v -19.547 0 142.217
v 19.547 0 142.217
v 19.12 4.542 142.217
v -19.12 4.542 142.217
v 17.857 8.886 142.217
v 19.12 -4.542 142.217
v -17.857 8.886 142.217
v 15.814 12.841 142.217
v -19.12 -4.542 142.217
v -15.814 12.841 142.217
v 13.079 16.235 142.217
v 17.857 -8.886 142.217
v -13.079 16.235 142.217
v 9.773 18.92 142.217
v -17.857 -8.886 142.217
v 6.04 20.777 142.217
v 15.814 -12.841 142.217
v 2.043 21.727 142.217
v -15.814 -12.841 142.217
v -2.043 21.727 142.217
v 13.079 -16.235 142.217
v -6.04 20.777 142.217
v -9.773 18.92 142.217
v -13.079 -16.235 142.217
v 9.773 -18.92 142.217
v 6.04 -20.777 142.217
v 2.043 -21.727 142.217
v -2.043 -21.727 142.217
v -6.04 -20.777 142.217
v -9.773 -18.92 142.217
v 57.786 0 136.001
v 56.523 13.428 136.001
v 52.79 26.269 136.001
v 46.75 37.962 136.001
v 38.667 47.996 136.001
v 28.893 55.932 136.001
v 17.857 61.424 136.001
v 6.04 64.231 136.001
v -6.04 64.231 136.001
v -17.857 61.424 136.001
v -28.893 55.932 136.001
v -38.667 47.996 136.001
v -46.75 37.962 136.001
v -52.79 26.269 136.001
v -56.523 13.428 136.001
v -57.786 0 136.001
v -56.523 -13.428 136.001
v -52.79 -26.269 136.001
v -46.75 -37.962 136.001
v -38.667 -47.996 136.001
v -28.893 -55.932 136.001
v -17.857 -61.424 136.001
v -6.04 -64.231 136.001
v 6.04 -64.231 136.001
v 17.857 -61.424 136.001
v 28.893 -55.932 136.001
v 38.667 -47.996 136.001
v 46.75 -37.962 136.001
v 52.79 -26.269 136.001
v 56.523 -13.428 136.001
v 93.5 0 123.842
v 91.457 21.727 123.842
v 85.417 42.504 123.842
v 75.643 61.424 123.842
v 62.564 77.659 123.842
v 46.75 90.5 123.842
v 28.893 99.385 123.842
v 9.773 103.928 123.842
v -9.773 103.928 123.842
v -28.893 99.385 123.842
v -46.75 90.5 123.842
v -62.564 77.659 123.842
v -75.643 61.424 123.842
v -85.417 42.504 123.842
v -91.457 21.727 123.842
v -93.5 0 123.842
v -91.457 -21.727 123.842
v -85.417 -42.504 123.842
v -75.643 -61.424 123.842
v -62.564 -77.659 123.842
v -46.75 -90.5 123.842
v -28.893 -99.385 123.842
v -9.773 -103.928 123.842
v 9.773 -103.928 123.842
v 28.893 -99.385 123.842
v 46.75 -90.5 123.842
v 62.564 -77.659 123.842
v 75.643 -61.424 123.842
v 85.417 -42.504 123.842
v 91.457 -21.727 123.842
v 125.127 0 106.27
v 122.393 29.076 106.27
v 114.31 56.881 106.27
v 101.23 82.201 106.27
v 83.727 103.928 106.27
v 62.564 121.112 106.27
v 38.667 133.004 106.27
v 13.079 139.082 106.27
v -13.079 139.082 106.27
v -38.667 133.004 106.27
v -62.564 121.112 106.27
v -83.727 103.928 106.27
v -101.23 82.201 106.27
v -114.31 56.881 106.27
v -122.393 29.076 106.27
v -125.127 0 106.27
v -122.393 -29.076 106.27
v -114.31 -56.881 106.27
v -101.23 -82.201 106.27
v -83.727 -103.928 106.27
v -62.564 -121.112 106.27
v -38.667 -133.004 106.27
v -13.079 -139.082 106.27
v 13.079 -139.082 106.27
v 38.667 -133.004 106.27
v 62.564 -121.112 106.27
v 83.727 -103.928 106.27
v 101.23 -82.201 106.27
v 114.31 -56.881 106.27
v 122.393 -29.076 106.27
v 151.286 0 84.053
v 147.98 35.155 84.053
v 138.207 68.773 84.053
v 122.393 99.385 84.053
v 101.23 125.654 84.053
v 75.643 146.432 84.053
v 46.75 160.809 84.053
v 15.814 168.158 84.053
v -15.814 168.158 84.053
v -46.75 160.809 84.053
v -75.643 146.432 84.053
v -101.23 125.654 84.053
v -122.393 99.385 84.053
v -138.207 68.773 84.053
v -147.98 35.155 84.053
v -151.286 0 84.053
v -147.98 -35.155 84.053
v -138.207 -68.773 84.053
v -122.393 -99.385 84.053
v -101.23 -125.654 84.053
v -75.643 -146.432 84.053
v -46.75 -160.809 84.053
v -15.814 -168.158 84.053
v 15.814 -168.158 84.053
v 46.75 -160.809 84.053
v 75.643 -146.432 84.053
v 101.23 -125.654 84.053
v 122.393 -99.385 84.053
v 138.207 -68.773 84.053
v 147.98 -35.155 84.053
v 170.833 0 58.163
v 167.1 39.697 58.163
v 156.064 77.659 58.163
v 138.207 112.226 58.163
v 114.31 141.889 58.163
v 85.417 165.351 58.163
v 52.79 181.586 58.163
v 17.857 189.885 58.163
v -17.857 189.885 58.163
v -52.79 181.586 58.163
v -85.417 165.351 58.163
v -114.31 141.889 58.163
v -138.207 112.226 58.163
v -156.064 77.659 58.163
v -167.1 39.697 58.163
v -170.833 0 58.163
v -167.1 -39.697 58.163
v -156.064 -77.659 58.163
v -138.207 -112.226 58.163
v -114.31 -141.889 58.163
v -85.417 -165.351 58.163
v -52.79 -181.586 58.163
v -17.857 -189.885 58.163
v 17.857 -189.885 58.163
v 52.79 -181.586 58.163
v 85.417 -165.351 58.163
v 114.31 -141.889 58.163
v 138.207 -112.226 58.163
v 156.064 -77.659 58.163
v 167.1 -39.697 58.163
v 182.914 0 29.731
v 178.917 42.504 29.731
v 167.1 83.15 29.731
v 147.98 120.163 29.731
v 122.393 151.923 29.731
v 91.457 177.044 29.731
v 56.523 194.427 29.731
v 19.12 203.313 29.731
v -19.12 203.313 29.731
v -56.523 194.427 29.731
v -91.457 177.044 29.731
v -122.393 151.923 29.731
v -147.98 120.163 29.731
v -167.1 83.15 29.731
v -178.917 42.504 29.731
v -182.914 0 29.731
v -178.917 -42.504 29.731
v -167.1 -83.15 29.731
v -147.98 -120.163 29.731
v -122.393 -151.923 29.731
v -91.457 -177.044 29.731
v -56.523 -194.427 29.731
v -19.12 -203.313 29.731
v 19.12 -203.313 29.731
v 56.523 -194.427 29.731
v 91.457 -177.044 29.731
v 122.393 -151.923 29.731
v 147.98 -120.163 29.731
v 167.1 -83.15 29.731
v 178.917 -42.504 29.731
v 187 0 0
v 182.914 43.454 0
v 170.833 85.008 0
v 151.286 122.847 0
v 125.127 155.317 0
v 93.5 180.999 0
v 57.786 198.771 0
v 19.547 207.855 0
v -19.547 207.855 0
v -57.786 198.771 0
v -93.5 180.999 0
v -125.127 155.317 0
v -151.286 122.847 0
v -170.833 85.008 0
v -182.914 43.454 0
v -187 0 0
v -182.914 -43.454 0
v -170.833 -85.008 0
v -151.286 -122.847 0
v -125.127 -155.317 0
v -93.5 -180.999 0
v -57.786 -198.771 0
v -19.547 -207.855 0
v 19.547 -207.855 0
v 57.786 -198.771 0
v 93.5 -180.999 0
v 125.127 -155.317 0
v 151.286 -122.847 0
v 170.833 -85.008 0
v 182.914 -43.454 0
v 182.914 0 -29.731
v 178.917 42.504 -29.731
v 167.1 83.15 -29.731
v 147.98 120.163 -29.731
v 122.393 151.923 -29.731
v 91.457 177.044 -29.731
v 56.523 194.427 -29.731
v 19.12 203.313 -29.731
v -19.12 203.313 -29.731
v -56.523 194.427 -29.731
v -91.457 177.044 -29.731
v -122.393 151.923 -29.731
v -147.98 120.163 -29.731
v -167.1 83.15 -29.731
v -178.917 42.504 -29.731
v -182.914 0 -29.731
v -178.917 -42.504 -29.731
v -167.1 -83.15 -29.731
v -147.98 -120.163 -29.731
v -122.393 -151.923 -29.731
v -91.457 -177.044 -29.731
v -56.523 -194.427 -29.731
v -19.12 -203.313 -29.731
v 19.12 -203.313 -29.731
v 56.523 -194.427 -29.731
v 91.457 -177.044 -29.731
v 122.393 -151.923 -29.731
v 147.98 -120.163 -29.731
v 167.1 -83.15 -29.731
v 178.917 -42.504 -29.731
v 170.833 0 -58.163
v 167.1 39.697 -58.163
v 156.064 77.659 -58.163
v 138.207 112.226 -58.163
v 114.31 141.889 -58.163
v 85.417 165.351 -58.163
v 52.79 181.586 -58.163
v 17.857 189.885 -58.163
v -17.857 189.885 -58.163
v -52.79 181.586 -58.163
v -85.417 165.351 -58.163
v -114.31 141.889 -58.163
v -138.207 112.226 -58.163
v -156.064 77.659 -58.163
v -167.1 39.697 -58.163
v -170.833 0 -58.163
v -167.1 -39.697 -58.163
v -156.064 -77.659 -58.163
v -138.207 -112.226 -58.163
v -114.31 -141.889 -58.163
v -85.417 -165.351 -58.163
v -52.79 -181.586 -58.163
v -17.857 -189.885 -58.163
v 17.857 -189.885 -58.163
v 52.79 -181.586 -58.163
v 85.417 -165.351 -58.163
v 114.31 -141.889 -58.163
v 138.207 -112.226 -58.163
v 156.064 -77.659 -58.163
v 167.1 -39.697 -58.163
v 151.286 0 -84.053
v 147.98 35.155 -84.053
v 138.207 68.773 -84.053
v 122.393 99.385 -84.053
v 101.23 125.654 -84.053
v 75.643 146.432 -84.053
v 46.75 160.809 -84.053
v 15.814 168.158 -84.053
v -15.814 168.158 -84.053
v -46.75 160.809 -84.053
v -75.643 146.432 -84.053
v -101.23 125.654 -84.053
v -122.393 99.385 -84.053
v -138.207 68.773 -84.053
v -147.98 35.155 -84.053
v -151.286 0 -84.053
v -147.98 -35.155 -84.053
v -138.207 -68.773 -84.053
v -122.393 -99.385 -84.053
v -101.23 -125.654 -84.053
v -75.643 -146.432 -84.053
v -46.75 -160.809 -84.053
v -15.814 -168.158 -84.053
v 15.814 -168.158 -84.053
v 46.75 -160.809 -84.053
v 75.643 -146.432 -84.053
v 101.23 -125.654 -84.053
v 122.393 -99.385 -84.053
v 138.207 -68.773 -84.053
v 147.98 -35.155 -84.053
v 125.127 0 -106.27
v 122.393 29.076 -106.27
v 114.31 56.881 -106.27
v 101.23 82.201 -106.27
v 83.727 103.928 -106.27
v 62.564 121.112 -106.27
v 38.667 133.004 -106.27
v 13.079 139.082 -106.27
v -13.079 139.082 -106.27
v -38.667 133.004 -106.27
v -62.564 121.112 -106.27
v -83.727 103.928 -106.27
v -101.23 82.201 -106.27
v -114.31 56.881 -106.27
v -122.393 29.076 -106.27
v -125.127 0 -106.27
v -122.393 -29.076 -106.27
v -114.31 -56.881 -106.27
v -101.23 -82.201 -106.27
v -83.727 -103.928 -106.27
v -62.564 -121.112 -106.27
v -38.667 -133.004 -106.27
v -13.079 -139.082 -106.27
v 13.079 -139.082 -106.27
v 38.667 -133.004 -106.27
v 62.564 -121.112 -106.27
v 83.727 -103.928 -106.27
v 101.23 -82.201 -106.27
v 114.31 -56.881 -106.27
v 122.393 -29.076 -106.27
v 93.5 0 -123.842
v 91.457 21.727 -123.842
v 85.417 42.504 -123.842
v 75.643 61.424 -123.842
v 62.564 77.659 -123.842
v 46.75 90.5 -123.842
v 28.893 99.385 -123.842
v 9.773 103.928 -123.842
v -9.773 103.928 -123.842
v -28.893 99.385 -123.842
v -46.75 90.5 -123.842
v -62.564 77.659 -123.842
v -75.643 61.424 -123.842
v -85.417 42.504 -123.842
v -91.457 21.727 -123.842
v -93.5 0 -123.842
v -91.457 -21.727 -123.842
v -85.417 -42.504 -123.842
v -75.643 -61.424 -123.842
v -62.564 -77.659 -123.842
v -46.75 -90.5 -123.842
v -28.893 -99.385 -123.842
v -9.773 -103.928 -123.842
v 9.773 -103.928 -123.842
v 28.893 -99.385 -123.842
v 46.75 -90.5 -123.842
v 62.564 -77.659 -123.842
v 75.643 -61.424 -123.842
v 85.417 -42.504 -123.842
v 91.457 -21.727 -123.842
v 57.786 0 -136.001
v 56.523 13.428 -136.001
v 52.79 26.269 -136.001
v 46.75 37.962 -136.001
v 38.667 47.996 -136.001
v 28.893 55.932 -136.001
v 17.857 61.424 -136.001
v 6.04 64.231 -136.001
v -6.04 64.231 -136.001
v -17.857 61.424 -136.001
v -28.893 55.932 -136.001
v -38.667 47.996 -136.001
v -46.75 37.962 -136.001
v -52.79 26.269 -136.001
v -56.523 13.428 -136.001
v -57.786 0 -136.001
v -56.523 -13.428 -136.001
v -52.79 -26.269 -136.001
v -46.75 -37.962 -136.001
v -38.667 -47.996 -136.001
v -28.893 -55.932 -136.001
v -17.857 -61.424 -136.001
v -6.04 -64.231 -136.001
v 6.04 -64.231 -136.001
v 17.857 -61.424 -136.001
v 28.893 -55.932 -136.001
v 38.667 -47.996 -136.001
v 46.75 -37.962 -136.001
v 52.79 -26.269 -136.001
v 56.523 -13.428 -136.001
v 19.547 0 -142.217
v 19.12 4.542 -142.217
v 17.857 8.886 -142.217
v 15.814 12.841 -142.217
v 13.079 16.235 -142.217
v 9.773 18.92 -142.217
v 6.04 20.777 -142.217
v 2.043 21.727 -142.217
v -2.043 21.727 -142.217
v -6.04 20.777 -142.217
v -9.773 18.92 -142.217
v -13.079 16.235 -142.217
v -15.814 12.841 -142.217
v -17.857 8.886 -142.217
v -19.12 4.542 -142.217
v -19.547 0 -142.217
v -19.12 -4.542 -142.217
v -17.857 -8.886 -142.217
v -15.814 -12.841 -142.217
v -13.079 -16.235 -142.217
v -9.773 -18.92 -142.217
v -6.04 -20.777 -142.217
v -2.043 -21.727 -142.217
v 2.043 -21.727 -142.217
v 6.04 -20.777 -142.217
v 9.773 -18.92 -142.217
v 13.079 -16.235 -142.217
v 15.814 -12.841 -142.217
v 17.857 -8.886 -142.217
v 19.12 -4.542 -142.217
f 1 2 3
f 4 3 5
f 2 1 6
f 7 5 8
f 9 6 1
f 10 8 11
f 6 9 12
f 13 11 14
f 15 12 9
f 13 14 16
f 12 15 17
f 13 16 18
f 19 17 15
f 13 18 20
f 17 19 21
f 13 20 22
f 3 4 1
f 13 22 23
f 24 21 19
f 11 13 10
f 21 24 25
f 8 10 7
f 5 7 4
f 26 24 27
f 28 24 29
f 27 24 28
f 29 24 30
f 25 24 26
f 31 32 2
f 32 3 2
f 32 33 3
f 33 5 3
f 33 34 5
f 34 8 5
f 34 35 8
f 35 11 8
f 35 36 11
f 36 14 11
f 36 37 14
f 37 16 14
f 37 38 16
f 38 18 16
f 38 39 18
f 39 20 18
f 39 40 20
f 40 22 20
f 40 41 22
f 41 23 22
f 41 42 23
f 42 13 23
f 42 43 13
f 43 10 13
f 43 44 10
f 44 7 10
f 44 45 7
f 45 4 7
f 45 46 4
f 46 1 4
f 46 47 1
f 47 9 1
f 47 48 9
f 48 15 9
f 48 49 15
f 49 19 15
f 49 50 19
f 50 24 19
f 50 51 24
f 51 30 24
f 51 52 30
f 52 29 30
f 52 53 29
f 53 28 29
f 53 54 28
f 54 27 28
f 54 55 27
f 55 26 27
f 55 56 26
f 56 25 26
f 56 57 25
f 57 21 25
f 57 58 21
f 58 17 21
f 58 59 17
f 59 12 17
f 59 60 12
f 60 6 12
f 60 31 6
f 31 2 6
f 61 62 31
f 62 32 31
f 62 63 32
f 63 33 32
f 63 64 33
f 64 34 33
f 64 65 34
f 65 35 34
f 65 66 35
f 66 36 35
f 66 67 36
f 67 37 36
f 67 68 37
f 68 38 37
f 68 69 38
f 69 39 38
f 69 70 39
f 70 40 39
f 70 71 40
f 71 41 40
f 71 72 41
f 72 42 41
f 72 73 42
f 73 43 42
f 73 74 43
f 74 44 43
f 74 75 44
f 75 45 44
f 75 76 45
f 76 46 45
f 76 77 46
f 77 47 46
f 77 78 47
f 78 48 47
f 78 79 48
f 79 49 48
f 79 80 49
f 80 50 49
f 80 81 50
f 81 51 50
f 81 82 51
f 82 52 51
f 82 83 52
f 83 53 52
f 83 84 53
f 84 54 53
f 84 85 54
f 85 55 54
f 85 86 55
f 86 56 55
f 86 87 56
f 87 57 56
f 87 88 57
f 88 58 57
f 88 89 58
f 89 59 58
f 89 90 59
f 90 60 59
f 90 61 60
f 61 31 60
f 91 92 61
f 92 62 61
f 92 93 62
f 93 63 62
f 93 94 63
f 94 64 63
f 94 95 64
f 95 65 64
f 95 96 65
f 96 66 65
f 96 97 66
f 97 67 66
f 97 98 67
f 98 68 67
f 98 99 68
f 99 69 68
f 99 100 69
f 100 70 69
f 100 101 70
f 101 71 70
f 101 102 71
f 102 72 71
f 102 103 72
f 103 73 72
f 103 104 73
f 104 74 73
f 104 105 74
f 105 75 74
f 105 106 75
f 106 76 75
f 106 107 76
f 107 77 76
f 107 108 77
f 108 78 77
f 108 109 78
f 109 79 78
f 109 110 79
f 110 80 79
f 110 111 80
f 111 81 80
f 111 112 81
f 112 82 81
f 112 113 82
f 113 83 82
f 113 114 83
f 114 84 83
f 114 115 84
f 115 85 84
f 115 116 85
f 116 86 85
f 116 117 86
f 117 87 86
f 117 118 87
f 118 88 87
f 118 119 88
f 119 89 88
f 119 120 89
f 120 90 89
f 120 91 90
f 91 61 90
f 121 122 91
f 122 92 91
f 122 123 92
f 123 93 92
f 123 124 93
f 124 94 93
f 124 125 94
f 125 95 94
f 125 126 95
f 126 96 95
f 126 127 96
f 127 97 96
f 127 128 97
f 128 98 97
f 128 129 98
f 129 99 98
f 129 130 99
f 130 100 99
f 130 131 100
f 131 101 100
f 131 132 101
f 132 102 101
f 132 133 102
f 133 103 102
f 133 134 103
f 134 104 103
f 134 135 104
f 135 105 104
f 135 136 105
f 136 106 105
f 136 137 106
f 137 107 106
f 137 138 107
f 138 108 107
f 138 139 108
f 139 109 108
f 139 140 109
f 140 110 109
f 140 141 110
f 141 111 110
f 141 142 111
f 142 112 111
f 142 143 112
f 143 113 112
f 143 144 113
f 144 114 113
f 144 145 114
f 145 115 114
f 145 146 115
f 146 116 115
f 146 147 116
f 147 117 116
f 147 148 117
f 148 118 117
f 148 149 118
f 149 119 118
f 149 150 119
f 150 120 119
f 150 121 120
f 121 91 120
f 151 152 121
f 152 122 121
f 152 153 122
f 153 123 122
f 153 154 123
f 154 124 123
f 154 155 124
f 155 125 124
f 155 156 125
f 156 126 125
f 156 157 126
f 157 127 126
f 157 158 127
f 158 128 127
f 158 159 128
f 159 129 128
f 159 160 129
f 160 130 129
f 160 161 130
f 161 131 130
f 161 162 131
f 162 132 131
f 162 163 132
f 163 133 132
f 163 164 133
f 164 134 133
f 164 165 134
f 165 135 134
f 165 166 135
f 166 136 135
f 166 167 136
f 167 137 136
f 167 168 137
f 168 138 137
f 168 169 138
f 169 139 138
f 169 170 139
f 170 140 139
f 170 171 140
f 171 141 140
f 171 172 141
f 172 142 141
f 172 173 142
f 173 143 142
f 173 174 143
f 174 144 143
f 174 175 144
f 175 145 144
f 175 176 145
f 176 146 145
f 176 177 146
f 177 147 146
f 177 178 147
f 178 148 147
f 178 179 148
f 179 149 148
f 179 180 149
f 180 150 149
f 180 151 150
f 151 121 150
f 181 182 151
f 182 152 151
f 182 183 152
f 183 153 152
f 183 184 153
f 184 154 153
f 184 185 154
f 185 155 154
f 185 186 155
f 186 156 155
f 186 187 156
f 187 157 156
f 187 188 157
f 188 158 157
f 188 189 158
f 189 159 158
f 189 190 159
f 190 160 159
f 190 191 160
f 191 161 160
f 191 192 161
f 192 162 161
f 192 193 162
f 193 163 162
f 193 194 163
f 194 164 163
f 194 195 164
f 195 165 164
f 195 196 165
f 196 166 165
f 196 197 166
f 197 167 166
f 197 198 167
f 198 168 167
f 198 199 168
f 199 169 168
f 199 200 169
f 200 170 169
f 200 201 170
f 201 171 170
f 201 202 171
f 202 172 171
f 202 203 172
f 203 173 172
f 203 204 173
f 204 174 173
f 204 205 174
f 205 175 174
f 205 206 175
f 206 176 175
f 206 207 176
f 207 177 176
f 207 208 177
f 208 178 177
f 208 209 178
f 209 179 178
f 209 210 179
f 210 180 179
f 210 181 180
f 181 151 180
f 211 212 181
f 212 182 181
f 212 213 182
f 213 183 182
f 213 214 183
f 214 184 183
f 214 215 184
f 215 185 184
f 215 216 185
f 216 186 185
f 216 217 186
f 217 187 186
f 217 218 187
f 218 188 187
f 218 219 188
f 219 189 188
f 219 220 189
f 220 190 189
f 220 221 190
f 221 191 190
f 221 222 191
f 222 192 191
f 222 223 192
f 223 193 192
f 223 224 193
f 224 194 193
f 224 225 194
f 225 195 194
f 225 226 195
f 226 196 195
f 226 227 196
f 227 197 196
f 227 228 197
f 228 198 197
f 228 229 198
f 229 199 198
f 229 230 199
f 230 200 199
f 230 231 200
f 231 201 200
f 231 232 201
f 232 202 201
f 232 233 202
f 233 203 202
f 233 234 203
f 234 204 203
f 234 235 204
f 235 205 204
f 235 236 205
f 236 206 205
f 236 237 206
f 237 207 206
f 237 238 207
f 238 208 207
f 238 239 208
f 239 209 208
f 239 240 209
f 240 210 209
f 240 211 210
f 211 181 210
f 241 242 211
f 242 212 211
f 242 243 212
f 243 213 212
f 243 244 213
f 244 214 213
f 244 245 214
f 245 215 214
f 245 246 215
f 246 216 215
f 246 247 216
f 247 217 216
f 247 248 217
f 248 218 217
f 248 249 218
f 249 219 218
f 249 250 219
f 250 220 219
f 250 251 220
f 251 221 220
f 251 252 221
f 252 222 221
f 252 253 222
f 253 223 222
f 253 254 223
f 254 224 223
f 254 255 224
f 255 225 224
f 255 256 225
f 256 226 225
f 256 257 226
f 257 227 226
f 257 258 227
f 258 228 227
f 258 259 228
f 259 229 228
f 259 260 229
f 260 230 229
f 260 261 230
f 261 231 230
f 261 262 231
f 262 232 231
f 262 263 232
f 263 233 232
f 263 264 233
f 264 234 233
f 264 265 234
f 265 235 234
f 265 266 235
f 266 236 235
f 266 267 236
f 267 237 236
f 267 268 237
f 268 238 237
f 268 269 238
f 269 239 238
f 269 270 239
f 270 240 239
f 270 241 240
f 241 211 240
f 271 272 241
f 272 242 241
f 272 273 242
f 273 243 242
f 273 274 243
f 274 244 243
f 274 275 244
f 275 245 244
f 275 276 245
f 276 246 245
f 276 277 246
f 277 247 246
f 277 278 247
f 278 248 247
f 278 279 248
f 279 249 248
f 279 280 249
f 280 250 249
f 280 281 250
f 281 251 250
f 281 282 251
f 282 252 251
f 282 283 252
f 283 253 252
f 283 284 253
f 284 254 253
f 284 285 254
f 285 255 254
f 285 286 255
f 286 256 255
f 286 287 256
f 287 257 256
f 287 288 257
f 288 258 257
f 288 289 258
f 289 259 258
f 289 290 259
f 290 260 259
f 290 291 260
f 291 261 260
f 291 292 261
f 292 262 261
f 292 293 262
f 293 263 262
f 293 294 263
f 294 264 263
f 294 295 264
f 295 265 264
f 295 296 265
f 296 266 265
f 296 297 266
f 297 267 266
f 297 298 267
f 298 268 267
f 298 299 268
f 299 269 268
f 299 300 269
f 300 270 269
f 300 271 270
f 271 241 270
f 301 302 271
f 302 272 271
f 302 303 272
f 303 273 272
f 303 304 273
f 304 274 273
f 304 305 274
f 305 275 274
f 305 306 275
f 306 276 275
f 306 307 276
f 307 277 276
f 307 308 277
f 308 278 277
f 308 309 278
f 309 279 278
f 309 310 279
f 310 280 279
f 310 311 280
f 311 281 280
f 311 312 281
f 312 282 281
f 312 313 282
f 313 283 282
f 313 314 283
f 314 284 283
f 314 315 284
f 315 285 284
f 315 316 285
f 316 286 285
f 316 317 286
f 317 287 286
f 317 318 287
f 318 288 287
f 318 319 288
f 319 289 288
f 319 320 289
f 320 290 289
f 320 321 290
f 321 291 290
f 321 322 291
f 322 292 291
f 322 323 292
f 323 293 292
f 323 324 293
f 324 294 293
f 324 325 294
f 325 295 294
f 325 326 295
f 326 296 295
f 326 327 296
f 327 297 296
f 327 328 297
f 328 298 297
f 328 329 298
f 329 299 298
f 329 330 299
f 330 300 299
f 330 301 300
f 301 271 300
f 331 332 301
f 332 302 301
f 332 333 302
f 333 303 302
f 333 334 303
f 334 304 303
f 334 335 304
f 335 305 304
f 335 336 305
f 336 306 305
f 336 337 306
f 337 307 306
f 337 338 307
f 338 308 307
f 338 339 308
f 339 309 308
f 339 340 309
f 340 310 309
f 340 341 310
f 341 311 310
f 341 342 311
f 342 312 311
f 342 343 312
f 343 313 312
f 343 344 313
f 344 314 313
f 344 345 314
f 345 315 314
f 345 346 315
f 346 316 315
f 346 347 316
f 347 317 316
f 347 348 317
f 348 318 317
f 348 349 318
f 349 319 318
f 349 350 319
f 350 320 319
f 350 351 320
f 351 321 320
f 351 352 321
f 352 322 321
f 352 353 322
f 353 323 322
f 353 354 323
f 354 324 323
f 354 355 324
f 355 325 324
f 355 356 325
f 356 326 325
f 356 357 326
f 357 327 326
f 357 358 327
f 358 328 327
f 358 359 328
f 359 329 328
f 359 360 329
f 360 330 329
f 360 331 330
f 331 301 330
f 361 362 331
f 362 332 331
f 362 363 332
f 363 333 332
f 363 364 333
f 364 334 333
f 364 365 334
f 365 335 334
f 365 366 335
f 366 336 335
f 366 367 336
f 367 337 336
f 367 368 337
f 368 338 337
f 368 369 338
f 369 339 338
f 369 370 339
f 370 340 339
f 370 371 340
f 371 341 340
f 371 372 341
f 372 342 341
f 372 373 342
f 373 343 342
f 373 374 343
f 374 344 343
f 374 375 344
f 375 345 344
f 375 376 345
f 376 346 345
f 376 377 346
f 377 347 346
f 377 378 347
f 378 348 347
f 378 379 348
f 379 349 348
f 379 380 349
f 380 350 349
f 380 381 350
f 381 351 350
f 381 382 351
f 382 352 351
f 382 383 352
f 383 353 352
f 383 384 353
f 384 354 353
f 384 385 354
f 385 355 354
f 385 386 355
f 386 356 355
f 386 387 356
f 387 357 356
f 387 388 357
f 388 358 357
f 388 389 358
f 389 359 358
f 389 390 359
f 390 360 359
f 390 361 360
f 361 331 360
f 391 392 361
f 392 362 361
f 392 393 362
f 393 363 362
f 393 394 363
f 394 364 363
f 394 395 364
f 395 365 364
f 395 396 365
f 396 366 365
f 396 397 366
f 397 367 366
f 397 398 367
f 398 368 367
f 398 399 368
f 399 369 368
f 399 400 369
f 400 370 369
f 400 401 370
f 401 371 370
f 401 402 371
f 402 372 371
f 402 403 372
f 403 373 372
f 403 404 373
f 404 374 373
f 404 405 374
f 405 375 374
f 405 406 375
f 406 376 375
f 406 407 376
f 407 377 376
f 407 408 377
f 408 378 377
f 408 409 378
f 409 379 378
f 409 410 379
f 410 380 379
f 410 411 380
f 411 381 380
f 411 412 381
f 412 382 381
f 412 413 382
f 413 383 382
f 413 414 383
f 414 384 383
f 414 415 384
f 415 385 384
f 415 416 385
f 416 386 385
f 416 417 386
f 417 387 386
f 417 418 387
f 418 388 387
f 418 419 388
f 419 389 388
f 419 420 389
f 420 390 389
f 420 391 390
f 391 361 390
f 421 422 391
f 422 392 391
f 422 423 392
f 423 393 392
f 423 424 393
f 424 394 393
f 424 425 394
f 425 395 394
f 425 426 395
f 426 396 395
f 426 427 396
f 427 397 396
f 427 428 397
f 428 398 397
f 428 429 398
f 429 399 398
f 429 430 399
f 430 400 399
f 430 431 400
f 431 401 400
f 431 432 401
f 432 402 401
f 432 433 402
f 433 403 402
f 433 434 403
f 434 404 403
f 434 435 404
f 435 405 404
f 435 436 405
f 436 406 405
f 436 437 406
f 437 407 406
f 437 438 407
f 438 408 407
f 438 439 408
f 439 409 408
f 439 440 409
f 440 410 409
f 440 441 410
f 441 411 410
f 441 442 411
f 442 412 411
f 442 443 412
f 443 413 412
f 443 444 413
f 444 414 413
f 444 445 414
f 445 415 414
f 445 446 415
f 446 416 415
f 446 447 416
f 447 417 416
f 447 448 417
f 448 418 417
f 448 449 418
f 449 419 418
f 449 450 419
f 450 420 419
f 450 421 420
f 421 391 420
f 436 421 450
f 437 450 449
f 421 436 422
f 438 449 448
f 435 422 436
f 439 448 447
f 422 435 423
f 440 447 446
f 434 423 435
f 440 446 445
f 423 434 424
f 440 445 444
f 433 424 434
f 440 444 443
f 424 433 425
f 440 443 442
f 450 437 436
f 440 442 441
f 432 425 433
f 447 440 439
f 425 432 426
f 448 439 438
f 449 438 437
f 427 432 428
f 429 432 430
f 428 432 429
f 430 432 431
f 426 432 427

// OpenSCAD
// Generated by SolidPython 1.0.1 on 2020-07-29 00:46:53


scale(v = [17, 19, 13]) {
	sphere(r = 11);
}
/***********************************************
*********      SolidPython code:      **********
************************************************
 
# import packages: SolidPython
from solid import *
from solid.utils import *
from itertools import chain, combinations, permutations


class Resize:

    def __init__(self, scad_file):
        self.scad_file = scad_file
        #self.scad_file = import_scad(scad_file)
        # cone/cylinder param:
        self.r1 = 0
        self.r2 = 0
        self.h = 0
        # rectangular prism param:
        self.w = 0
        self.l = 0
        # ellipse param:
        self.r = 0

    # import OpenScad code (file name corresponds to shape)


    # classify shape + parameters
    def assign(self, param1, param2, param3):
        if self.scad_file == 'cone.scad':
            self.r1 = param1
            self.r2 = param2
            self.h = param3
        elif self.scad_file == 'cylinder.scad':
            self.r1 = param1
            self.r2 = param2
            self.h = param3
        elif self.scad_file == 'rectangularPrism.scad':
            self.h = param1
            self.l = param2
            self.w = param3
        else:
            self.r = param1
            self.h = param2

    # resize parameters
    def iterate(self):
        x = range(3, 20, 2)
        i = 1
        if self.scad_file == 'cone.scad':
            tempList = list(permutations(x, 2))
            for temp in tempList:
                param1 = temp[0]
                param2 = temp[1]
                filepath = 'produced_scad_files/' + 'cone' + str(param1) + '_' + str(param2) + '_' + '.scad'
                scad_render_to_file(cylinder(h=param1, r1=param2, r2=0), filepath)

        elif self.scad_file == 'cylinder.scad':
            tempList = list(permutations(x, 3))
            for temp in tempList:
                param1 = temp[0]
                param2 = temp[1]
                filepath = 'produced_scad_files/' + 'cylinder' + str(param1) + '_' + str(param2) + '_' + '.scad'
                scad_render_to_file(cylinder(h=param1, r1=param2, r2=param2), filepath)

        elif self.scad_file == 'rectangularPrism.scad':
            tempList = list(permutations(x, 3))
            for temp in tempList:
                param1 = temp[0]
                param2 = temp[1]
                param3 = temp[2]
                filepath = 'produced_scad_files/' + 'rectangularPrism' + str(param1) + '_' + str(param2) + '_' + str(
                    param3) + '.scad'
                scad_render_to_file(cube(size=(param1, param2, param3)), filepath)

        elif self.scad_file == 'ellipse.scad':
            tempList = list(permutations(x, 4))
            for temp in tempList:
                param1 = temp[0]
                param2 = temp[1]
                param3 = temp[2]
                param4 = temp[3]
                filepath = 'produced_scad_files/' + 'ellipse' + str(param1) + '_' + str(param2) + '_' + str(param3) + '_' + str(param4) + '.scad'
                scad_render_to_file(scale([param1, param2, param3])(sphere(r=param4)), filepath)

    def render_to_scadfile(self):
        scad_render_to_file(scad, 'example.scad') 
 
************************************************/
